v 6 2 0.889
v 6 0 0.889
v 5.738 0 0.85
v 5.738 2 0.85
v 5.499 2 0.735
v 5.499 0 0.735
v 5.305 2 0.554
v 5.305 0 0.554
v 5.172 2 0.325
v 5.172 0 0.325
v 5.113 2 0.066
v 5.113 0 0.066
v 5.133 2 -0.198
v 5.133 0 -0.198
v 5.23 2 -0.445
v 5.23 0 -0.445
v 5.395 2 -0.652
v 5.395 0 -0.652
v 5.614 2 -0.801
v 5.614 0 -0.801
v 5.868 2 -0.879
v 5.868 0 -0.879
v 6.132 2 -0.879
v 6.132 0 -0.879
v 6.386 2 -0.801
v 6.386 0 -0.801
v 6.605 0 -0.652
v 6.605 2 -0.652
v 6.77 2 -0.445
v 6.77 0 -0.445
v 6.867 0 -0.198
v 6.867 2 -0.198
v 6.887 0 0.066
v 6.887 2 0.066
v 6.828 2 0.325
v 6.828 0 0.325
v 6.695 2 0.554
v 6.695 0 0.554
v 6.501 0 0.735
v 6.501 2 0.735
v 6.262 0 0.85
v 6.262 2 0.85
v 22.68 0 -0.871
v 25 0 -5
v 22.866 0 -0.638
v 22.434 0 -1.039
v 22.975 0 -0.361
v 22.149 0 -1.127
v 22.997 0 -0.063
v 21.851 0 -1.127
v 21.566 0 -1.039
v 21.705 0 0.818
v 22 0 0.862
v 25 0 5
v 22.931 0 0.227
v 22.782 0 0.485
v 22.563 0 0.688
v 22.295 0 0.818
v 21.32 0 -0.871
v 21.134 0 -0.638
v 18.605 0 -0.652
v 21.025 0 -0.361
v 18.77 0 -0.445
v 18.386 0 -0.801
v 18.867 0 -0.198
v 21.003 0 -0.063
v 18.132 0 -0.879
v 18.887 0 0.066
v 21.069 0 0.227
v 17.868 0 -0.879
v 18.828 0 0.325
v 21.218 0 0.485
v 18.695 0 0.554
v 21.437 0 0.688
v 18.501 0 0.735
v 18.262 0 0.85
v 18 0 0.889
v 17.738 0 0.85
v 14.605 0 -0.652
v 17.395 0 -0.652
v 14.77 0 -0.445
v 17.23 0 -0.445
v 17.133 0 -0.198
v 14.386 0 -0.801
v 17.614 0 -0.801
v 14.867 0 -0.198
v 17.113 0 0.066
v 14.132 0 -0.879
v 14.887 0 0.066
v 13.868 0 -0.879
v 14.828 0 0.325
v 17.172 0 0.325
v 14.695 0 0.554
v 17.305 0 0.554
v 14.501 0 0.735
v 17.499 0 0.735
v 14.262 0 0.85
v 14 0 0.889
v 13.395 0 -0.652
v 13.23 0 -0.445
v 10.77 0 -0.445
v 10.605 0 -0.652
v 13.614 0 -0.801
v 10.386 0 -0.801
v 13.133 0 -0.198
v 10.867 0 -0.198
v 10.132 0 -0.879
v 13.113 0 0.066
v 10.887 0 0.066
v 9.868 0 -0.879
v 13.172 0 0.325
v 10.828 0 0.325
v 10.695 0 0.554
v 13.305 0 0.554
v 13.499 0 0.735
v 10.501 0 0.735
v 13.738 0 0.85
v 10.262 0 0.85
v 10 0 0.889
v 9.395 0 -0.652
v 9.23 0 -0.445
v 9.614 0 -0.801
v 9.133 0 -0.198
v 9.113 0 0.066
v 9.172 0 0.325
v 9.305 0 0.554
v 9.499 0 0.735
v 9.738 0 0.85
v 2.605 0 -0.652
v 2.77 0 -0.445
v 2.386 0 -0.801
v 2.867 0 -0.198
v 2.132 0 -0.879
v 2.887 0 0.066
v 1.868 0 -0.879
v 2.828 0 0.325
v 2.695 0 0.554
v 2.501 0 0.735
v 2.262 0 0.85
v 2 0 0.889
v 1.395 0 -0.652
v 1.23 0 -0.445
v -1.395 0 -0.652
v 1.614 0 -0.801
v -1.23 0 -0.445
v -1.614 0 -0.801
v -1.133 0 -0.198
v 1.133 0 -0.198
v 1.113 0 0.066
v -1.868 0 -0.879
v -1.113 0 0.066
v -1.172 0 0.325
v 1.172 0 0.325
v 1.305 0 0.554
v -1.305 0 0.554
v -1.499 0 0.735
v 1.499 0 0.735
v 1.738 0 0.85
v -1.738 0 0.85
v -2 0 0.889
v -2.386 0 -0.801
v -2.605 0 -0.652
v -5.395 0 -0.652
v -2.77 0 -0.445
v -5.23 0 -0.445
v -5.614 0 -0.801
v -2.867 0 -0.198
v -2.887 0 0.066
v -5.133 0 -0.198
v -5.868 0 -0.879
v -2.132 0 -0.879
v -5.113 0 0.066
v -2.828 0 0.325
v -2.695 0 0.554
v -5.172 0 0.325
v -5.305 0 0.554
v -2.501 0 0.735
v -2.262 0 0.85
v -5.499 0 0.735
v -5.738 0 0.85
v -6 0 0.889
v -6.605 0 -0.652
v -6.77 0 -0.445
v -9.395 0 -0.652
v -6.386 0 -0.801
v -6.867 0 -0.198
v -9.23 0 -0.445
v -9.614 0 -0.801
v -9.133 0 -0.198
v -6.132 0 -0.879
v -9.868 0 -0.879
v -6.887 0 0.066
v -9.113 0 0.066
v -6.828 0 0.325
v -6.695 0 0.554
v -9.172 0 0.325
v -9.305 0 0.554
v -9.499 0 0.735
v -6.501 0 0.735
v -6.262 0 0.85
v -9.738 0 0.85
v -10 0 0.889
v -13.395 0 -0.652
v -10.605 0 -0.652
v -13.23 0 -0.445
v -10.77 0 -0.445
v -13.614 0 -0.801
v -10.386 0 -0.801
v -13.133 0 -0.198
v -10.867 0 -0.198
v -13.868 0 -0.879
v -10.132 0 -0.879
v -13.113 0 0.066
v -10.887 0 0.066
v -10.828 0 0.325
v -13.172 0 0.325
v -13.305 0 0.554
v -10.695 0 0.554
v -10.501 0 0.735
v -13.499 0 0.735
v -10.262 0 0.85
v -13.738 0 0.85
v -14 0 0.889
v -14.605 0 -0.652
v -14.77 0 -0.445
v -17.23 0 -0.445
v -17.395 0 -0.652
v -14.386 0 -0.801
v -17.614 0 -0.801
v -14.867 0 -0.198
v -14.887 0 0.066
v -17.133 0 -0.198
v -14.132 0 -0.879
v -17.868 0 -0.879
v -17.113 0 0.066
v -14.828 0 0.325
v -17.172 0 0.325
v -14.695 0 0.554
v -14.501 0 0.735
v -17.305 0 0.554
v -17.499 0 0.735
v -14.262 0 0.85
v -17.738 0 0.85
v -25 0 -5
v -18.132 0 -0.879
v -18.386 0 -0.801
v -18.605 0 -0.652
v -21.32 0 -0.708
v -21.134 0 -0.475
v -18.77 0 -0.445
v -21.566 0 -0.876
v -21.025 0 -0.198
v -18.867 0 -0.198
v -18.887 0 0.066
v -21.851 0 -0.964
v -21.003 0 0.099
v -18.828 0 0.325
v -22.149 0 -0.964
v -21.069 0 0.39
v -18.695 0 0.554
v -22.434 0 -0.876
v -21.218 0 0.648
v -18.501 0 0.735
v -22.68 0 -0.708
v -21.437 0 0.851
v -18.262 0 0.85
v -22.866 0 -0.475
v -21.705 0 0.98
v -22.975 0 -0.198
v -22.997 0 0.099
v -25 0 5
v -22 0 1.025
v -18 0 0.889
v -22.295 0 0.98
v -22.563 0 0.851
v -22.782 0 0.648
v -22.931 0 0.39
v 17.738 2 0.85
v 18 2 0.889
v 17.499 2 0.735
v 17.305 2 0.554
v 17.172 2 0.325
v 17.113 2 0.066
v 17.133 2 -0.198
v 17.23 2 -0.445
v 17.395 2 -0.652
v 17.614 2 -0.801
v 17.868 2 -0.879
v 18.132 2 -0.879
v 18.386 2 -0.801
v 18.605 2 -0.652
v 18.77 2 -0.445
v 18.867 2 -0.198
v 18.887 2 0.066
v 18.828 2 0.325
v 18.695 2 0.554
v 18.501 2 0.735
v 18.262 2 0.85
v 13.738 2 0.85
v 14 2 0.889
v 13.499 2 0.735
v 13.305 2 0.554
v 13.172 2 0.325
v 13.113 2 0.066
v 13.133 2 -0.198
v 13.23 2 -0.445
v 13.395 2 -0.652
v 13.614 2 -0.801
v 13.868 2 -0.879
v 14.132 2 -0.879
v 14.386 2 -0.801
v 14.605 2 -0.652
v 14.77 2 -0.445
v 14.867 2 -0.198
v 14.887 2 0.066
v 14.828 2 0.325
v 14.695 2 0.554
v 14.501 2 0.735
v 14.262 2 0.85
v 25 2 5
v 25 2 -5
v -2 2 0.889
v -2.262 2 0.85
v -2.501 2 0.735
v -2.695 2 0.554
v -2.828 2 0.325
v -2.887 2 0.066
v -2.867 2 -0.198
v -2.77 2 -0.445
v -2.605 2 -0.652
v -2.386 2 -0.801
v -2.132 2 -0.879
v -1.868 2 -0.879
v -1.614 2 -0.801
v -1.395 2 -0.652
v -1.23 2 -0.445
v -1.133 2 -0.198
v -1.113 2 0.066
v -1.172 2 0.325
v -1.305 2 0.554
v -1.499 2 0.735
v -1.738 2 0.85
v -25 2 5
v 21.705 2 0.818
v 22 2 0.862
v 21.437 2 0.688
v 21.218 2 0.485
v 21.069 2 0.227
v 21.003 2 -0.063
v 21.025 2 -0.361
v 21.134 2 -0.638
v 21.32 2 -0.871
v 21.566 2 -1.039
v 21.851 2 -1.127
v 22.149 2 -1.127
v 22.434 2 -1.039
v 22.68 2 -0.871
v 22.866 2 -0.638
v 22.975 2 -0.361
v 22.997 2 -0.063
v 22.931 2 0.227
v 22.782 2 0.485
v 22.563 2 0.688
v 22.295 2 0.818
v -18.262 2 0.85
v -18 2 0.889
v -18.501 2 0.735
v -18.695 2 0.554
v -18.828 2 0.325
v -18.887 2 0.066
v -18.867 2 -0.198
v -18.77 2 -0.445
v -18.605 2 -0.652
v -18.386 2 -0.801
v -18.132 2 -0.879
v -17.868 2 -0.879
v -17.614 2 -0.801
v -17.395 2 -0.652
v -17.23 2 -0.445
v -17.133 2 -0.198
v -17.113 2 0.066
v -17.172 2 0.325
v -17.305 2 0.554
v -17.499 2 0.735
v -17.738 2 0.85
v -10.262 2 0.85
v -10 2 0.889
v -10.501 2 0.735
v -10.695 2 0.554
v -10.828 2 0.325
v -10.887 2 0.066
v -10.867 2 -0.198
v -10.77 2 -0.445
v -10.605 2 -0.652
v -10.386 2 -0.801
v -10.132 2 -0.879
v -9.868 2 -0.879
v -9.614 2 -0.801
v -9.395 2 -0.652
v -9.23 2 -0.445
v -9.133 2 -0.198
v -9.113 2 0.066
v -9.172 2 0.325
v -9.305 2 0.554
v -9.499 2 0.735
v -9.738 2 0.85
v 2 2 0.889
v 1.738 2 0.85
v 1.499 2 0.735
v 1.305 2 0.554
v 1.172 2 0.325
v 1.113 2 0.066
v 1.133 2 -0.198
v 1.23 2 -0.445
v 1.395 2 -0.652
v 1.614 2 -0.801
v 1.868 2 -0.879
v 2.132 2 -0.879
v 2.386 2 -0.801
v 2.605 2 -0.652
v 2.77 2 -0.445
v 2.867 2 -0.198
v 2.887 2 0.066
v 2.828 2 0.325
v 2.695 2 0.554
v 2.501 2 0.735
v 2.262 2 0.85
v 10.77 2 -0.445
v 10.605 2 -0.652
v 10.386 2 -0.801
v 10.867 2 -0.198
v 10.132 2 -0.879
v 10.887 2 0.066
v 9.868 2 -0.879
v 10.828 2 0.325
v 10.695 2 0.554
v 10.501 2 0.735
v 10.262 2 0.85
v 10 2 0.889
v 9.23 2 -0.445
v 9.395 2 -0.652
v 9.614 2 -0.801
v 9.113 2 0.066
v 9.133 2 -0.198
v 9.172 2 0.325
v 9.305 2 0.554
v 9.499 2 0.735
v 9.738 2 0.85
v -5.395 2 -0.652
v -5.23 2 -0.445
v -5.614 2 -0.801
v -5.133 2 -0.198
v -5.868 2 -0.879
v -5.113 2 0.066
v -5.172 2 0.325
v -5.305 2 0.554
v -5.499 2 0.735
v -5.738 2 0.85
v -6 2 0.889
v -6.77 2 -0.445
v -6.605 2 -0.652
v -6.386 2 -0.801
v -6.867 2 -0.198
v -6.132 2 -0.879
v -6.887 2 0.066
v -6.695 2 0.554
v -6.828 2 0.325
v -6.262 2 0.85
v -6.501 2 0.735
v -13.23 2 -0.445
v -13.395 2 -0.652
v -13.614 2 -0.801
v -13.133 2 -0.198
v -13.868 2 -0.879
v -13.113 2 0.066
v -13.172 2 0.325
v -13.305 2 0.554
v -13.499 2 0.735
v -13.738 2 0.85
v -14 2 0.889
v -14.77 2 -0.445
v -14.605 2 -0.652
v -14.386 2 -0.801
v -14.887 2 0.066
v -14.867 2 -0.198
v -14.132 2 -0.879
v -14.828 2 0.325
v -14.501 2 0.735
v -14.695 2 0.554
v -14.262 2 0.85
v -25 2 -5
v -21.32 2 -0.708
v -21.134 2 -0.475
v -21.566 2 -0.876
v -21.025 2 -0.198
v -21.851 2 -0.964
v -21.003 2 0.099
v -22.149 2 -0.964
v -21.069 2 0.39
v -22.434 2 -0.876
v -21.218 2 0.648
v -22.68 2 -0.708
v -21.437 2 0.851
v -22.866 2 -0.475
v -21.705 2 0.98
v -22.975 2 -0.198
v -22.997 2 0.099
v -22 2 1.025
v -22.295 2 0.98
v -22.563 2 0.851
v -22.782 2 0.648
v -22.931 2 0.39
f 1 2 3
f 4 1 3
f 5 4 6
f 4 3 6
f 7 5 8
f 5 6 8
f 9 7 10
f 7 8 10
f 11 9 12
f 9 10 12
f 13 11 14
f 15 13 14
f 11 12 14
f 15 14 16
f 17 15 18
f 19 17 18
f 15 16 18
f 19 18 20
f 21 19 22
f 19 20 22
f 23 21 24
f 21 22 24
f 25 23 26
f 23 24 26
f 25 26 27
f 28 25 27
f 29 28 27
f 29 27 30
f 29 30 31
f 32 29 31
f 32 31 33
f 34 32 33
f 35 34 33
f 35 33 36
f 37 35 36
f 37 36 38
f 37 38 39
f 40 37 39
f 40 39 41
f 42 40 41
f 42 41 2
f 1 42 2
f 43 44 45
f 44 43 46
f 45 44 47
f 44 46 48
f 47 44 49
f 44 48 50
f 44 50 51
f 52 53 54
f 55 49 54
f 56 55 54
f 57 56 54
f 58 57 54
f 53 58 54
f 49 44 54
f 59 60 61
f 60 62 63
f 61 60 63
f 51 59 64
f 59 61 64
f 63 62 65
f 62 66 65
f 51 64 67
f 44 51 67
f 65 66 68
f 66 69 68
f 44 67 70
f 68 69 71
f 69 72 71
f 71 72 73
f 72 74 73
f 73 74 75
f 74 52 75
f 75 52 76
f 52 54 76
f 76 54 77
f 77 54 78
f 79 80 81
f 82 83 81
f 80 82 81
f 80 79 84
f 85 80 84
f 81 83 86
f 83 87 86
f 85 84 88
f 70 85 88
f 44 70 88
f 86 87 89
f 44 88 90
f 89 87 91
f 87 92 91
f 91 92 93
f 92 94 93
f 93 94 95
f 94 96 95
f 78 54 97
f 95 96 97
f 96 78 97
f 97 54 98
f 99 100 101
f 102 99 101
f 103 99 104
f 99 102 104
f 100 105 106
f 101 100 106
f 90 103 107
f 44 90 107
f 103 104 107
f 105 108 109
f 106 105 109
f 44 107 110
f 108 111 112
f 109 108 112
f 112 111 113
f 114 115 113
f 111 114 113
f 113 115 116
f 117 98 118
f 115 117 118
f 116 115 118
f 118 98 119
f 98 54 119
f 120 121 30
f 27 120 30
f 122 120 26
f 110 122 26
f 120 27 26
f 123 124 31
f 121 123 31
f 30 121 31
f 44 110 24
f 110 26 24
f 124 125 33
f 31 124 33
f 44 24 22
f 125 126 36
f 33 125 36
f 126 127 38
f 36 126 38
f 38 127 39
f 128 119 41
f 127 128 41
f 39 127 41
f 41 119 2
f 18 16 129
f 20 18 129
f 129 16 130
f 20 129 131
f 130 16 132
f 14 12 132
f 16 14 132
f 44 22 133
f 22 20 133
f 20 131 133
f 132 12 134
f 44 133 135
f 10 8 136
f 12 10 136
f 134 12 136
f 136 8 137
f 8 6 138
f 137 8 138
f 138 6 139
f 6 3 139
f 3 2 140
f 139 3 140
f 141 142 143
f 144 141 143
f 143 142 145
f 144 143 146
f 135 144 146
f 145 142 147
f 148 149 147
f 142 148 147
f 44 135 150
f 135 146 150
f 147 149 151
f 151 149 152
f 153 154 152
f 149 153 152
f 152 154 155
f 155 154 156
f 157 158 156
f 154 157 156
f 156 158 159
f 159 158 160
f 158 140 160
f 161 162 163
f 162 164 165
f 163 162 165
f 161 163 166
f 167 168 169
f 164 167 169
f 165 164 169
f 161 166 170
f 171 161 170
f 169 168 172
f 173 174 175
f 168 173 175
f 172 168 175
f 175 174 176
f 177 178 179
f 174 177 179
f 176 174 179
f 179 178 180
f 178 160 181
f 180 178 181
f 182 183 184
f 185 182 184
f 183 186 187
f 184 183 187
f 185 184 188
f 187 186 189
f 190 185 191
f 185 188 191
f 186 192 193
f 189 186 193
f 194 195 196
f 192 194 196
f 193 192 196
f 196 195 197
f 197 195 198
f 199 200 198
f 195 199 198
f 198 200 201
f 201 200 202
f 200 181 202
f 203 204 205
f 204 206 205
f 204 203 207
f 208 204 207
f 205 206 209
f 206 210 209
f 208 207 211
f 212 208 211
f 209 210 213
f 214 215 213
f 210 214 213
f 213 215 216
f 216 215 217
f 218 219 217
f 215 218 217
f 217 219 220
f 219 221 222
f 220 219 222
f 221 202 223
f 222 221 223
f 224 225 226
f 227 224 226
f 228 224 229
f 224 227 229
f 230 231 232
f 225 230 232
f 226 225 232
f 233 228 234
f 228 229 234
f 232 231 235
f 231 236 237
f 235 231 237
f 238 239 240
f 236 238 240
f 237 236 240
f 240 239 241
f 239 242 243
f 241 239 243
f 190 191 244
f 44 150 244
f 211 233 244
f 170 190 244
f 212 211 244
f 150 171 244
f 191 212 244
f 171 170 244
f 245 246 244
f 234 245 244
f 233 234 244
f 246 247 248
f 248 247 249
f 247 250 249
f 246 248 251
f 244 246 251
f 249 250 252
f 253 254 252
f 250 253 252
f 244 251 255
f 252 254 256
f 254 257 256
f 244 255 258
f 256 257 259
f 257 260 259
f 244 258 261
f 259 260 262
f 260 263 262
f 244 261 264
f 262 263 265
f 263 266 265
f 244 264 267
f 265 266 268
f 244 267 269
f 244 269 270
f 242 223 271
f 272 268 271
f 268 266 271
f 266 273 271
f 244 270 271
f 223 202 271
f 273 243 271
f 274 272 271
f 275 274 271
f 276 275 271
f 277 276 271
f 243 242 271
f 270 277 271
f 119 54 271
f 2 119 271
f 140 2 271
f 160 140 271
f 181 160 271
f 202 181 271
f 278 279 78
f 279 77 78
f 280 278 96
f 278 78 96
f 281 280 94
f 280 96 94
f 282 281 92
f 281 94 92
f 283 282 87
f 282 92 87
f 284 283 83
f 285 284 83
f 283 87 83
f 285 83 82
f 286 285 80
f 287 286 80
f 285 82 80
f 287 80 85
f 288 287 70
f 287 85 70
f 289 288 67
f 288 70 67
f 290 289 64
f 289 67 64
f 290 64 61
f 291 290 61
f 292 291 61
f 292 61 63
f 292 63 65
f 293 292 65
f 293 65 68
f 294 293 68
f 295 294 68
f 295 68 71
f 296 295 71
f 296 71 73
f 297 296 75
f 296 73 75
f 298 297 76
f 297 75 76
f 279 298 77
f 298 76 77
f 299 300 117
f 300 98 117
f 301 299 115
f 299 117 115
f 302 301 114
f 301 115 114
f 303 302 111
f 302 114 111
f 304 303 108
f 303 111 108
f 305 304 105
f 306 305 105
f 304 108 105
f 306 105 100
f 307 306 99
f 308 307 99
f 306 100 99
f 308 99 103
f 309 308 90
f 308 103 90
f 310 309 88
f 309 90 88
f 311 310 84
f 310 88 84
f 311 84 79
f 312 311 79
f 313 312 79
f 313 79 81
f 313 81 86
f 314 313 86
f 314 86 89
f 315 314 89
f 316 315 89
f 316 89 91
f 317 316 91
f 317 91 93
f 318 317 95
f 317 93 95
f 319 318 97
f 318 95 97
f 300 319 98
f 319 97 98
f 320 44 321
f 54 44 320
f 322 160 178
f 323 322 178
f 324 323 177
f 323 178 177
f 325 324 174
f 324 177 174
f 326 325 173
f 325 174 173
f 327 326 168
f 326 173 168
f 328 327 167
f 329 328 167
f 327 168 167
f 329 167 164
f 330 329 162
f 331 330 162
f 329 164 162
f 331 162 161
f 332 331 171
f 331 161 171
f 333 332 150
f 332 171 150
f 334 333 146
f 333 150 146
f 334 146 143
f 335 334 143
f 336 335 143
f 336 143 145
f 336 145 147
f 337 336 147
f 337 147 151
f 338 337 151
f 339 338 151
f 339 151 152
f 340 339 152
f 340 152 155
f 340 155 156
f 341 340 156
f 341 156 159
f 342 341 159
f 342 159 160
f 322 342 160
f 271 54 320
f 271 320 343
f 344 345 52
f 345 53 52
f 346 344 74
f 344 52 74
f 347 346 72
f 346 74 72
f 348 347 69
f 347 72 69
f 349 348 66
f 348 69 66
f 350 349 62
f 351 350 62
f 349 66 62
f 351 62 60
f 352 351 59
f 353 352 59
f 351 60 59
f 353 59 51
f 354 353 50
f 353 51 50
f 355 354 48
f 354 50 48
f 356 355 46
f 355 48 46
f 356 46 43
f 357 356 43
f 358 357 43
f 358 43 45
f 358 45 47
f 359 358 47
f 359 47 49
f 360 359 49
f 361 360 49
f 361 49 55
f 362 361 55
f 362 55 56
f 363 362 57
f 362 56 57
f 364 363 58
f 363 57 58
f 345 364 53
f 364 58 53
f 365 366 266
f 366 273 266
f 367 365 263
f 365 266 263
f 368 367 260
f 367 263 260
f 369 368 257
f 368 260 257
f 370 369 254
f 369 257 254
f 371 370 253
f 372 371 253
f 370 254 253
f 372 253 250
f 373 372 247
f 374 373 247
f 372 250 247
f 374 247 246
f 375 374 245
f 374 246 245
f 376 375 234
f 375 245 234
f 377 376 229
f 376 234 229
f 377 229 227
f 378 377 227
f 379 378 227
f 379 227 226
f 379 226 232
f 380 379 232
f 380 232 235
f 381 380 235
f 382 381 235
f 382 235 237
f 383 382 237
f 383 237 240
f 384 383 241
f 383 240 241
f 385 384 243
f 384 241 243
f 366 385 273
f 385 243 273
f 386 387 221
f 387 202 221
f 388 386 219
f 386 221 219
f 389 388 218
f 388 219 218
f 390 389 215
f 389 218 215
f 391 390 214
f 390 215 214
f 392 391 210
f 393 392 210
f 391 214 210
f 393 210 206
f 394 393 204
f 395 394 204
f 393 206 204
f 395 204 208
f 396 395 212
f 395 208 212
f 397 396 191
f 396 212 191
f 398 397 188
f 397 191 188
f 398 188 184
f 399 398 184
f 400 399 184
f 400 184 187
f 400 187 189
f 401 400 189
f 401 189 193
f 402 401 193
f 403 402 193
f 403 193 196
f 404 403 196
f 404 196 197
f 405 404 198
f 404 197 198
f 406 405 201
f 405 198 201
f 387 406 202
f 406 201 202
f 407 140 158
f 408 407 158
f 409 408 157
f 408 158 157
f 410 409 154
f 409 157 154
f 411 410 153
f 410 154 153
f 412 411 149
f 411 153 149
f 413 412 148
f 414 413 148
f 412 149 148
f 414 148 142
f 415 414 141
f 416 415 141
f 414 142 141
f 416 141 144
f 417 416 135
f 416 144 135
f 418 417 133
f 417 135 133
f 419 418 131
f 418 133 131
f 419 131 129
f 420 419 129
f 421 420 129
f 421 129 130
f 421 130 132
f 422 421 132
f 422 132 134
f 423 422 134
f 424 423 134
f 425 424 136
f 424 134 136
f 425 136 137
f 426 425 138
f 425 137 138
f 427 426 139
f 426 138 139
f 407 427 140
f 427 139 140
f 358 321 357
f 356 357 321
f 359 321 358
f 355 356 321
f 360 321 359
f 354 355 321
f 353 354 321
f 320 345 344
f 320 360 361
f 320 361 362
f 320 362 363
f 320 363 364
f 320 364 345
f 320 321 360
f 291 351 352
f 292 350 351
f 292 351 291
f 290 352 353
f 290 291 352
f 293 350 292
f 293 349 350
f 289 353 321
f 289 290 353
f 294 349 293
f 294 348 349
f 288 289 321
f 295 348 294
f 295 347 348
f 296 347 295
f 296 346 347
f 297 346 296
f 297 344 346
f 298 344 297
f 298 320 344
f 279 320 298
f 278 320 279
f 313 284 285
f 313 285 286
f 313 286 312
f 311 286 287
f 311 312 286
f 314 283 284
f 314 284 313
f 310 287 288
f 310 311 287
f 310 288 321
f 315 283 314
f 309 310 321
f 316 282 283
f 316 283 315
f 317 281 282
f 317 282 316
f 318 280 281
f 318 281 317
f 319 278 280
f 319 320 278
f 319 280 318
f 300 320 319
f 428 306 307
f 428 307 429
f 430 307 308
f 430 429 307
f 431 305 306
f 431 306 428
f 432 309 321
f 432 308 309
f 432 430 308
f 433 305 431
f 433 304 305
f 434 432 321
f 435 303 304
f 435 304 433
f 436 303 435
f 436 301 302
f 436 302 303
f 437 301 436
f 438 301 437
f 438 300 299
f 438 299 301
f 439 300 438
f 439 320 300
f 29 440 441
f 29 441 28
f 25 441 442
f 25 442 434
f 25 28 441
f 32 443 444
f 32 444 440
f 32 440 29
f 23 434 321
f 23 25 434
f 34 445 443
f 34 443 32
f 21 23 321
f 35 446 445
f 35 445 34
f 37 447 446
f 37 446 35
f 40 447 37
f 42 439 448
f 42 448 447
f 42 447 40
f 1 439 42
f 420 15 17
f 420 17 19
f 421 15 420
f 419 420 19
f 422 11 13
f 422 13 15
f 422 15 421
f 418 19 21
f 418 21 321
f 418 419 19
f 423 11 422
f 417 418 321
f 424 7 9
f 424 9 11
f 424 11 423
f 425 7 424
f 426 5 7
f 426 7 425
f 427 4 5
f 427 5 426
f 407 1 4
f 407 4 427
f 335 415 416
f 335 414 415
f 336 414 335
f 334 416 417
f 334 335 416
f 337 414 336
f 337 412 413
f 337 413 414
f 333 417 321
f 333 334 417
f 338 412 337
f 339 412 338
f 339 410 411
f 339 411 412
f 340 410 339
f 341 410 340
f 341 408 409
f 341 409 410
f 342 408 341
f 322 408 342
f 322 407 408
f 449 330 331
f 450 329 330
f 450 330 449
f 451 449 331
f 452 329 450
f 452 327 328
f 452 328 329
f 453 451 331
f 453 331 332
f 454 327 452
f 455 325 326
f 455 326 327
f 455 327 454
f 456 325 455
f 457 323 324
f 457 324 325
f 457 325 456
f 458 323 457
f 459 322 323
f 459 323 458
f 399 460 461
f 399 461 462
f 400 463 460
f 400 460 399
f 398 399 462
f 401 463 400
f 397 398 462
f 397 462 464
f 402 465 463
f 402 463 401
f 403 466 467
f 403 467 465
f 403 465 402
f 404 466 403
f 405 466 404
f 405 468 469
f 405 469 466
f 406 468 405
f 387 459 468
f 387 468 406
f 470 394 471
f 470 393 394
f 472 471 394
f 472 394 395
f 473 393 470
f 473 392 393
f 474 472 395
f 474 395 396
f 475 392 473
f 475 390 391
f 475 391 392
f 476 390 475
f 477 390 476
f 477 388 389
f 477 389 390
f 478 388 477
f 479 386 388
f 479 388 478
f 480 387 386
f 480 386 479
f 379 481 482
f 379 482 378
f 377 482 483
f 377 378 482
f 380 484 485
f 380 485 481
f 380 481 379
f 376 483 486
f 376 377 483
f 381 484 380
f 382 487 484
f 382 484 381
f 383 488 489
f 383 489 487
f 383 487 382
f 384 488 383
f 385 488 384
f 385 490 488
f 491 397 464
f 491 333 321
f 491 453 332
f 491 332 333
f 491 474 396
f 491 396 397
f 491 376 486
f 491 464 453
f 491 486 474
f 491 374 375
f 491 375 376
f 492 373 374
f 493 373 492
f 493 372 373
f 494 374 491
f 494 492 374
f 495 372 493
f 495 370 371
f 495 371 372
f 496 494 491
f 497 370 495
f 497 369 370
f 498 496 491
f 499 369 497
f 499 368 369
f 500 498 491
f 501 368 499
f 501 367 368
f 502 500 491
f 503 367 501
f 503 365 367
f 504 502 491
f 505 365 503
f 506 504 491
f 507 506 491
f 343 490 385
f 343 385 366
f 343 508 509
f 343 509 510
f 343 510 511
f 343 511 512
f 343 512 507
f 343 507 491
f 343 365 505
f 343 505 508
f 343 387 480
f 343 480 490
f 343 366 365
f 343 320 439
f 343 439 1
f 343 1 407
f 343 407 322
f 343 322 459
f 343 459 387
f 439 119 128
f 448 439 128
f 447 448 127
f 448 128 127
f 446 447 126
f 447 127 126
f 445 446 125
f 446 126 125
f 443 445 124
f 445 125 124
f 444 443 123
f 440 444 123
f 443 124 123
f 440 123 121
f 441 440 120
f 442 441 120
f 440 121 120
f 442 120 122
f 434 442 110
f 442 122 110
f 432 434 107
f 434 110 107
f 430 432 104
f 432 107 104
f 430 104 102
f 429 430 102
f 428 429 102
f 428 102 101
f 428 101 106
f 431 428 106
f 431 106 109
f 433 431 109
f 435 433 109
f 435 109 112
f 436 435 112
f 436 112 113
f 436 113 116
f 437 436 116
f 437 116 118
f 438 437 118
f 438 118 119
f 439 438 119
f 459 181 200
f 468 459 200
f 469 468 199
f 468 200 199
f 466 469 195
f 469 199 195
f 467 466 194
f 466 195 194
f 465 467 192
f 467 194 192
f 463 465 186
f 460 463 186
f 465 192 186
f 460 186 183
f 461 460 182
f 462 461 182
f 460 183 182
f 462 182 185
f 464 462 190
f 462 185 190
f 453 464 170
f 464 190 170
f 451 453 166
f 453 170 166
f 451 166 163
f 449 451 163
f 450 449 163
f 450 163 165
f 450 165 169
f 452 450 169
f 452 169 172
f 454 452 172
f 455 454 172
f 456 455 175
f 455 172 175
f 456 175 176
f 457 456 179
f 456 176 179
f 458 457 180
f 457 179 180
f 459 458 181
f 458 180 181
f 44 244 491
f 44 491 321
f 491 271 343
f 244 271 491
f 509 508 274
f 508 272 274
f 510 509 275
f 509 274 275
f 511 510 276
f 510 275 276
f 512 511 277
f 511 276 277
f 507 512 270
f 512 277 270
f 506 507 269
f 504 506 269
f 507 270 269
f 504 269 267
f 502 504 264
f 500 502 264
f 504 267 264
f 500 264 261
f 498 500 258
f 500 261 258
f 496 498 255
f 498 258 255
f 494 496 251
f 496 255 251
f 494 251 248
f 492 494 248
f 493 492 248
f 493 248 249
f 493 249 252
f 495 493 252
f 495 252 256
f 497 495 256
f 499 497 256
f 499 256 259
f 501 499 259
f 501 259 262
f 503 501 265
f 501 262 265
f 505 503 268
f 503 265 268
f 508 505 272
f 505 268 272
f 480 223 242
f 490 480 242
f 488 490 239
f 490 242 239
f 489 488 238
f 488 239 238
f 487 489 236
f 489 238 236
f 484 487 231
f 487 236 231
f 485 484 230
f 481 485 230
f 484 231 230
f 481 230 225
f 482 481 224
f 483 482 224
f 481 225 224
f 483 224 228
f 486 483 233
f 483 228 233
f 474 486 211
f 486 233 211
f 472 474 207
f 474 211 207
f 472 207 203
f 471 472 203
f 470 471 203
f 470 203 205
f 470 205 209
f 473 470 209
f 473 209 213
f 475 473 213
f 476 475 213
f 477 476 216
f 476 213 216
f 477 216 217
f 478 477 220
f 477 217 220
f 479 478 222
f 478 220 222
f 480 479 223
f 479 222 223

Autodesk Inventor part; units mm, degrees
ref_plane "YZ Plane" through (0, 0, 0) normal (1, 0, 0) x (0, 1, 0)
ref_plane "XZ Plane" through (0, 0, 0) normal (0, 1, 0) x (-1, 0, 0)
ref_plane "XY Plane" through (0, 0, 0) normal (0, 0, 1) x (1, 0, 0)
sketch "Sketch1" plane through (0, 0, 0) normal (0, 1, 0) x (-1, 0, 0)
  line L0 (25, -5) -> (-25, -5)
  line L1 (-25, -5) -> (-25, 5)
  line L2 (-25, 5) -> (25, 5)
  line L3 (25, 5) -> (25, -5)
  line L4 (25, -5) -> (-25, 5) construction
  line L5 (-25, -5) -> (25, 5) construction
  point P0 (0, 0)
  dimension "d0" = 10
  dimension "d1" = 50
extrude "Extrusion1" add sketch "Sketch1" along normal blind 2
sketch "Sketch2" plane through (0, 2, 0) normal (0, 1, 0) x (1, 0, 0)
  line L0 (-25, -5) -> (25, -5) projected
  line L1 (25, -5) -> (25, 5) projected
  line L2 (25, 5) -> (-25, 5) projected
  line L3 (-25, 5) -> (-25, -5) projected
  line L4 (-25, 0) -> (25, 0)
  line L5 (0, 5) -> (0, -5)
  point P0 (0, 0)
  point P1 (-18, 0)
  point P2 (18, 0)
  dimension "d11" = 18
  dimension "d12" = 18
hole "Hole1" at (-18, 2, 0) at (18, 2, 0) direction (0, -1, 0) diameter 1.778 end through all
sketch "Sketch3" plane through (0, 2, 0) normal (0, 1, 0) x (1, 0, 0)
  circle A0 centre (-18, 0) radius 0.889 projected
  circle A1 centre (18, 0) radius 0.889 projected
  line L0 (-25, -5) -> (25, -5) projected
  line L1 (25, -5) -> (25, 5) projected
  line L2 (25, 5) -> (-25, 5) projected
  line L3 (-25, 5) -> (-25, -5) projected
  line L4 (-25, 0) -> (25, 0) construction
  line L5 (0, 5) -> (0, -5) construction
  point P0 (0, 0)
  point P1 (14, 0)
  point P2 (-14, 0)
  point P3 (-10, 0)
  point P4 (-6, 0)
  point P5 (-2, 0)
  point P6 (2, 0)
  point P7 (6, 0)
  point P8 (10, 0)
  dimension "d21" = 4
  dimension "d22" = 4
  dimension "d23" = 4
  dimension "d24" = 2
  dimension "d25" = 2
  dimension "d26" = 4
  dimension "d27" = 4
  dimension "d28" = 4
hole "Hole2" at (14, 2, 0) at (-14, 2, 0) at (-10, 2, 0) at (-6, 2, 0) at (-2, 2, 0) at (2, 2, 0) at (6, 2, 0) at (10, 2, 0) direction (0, -1, 0) diameter 1.778 end through all
sketch "Sketch4" plane through (0, 2, 0) normal (0, 1, 0) x (1, 0, 0)
  circle A0 centre (6, 0) radius 0.889 projected
  circle A1 centre (-2, 0) radius 0.889 projected
  circle A2 centre (-10, 0) radius 0.889 projected
  circle A3 centre (14, 0) radius 0.889 projected
  circle A4 centre (-14, 0) radius 0.889 projected
  circle A5 centre (-6, 0) radius 0.889 projected
  circle A6 centre (2, 0) radius 0.889 projected
  circle A7 centre (10, 0) radius 0.889 projected
  circle A8 centre (-18, 0) radius 0.889 projected
  circle A9 centre (18, 0) radius 0.889 projected
  line L0 (-25, -5) -> (25, -5) projected
  line L1 (25, -5) -> (25, 5) projected
  line L2 (25, 5) -> (-25, 5) projected
  line L3 (-25, 5) -> (-25, -5) projected
  line L4 (-25, 0) -> (25, 0) construction
  point P0 (0, 0)
  point P1 (-22, -0.0247)
  point P2 (22, 0.138)
  dimension "d37" = 4
  dimension "d38" = 4
hole "Hole3" at (-22, 2, 0.0247) at (22, 2, -0.138) direction (0, -1, 0) diameter 2 end through all
equation "\"d38\" = d37"
properties part number "Busbar Copper"
